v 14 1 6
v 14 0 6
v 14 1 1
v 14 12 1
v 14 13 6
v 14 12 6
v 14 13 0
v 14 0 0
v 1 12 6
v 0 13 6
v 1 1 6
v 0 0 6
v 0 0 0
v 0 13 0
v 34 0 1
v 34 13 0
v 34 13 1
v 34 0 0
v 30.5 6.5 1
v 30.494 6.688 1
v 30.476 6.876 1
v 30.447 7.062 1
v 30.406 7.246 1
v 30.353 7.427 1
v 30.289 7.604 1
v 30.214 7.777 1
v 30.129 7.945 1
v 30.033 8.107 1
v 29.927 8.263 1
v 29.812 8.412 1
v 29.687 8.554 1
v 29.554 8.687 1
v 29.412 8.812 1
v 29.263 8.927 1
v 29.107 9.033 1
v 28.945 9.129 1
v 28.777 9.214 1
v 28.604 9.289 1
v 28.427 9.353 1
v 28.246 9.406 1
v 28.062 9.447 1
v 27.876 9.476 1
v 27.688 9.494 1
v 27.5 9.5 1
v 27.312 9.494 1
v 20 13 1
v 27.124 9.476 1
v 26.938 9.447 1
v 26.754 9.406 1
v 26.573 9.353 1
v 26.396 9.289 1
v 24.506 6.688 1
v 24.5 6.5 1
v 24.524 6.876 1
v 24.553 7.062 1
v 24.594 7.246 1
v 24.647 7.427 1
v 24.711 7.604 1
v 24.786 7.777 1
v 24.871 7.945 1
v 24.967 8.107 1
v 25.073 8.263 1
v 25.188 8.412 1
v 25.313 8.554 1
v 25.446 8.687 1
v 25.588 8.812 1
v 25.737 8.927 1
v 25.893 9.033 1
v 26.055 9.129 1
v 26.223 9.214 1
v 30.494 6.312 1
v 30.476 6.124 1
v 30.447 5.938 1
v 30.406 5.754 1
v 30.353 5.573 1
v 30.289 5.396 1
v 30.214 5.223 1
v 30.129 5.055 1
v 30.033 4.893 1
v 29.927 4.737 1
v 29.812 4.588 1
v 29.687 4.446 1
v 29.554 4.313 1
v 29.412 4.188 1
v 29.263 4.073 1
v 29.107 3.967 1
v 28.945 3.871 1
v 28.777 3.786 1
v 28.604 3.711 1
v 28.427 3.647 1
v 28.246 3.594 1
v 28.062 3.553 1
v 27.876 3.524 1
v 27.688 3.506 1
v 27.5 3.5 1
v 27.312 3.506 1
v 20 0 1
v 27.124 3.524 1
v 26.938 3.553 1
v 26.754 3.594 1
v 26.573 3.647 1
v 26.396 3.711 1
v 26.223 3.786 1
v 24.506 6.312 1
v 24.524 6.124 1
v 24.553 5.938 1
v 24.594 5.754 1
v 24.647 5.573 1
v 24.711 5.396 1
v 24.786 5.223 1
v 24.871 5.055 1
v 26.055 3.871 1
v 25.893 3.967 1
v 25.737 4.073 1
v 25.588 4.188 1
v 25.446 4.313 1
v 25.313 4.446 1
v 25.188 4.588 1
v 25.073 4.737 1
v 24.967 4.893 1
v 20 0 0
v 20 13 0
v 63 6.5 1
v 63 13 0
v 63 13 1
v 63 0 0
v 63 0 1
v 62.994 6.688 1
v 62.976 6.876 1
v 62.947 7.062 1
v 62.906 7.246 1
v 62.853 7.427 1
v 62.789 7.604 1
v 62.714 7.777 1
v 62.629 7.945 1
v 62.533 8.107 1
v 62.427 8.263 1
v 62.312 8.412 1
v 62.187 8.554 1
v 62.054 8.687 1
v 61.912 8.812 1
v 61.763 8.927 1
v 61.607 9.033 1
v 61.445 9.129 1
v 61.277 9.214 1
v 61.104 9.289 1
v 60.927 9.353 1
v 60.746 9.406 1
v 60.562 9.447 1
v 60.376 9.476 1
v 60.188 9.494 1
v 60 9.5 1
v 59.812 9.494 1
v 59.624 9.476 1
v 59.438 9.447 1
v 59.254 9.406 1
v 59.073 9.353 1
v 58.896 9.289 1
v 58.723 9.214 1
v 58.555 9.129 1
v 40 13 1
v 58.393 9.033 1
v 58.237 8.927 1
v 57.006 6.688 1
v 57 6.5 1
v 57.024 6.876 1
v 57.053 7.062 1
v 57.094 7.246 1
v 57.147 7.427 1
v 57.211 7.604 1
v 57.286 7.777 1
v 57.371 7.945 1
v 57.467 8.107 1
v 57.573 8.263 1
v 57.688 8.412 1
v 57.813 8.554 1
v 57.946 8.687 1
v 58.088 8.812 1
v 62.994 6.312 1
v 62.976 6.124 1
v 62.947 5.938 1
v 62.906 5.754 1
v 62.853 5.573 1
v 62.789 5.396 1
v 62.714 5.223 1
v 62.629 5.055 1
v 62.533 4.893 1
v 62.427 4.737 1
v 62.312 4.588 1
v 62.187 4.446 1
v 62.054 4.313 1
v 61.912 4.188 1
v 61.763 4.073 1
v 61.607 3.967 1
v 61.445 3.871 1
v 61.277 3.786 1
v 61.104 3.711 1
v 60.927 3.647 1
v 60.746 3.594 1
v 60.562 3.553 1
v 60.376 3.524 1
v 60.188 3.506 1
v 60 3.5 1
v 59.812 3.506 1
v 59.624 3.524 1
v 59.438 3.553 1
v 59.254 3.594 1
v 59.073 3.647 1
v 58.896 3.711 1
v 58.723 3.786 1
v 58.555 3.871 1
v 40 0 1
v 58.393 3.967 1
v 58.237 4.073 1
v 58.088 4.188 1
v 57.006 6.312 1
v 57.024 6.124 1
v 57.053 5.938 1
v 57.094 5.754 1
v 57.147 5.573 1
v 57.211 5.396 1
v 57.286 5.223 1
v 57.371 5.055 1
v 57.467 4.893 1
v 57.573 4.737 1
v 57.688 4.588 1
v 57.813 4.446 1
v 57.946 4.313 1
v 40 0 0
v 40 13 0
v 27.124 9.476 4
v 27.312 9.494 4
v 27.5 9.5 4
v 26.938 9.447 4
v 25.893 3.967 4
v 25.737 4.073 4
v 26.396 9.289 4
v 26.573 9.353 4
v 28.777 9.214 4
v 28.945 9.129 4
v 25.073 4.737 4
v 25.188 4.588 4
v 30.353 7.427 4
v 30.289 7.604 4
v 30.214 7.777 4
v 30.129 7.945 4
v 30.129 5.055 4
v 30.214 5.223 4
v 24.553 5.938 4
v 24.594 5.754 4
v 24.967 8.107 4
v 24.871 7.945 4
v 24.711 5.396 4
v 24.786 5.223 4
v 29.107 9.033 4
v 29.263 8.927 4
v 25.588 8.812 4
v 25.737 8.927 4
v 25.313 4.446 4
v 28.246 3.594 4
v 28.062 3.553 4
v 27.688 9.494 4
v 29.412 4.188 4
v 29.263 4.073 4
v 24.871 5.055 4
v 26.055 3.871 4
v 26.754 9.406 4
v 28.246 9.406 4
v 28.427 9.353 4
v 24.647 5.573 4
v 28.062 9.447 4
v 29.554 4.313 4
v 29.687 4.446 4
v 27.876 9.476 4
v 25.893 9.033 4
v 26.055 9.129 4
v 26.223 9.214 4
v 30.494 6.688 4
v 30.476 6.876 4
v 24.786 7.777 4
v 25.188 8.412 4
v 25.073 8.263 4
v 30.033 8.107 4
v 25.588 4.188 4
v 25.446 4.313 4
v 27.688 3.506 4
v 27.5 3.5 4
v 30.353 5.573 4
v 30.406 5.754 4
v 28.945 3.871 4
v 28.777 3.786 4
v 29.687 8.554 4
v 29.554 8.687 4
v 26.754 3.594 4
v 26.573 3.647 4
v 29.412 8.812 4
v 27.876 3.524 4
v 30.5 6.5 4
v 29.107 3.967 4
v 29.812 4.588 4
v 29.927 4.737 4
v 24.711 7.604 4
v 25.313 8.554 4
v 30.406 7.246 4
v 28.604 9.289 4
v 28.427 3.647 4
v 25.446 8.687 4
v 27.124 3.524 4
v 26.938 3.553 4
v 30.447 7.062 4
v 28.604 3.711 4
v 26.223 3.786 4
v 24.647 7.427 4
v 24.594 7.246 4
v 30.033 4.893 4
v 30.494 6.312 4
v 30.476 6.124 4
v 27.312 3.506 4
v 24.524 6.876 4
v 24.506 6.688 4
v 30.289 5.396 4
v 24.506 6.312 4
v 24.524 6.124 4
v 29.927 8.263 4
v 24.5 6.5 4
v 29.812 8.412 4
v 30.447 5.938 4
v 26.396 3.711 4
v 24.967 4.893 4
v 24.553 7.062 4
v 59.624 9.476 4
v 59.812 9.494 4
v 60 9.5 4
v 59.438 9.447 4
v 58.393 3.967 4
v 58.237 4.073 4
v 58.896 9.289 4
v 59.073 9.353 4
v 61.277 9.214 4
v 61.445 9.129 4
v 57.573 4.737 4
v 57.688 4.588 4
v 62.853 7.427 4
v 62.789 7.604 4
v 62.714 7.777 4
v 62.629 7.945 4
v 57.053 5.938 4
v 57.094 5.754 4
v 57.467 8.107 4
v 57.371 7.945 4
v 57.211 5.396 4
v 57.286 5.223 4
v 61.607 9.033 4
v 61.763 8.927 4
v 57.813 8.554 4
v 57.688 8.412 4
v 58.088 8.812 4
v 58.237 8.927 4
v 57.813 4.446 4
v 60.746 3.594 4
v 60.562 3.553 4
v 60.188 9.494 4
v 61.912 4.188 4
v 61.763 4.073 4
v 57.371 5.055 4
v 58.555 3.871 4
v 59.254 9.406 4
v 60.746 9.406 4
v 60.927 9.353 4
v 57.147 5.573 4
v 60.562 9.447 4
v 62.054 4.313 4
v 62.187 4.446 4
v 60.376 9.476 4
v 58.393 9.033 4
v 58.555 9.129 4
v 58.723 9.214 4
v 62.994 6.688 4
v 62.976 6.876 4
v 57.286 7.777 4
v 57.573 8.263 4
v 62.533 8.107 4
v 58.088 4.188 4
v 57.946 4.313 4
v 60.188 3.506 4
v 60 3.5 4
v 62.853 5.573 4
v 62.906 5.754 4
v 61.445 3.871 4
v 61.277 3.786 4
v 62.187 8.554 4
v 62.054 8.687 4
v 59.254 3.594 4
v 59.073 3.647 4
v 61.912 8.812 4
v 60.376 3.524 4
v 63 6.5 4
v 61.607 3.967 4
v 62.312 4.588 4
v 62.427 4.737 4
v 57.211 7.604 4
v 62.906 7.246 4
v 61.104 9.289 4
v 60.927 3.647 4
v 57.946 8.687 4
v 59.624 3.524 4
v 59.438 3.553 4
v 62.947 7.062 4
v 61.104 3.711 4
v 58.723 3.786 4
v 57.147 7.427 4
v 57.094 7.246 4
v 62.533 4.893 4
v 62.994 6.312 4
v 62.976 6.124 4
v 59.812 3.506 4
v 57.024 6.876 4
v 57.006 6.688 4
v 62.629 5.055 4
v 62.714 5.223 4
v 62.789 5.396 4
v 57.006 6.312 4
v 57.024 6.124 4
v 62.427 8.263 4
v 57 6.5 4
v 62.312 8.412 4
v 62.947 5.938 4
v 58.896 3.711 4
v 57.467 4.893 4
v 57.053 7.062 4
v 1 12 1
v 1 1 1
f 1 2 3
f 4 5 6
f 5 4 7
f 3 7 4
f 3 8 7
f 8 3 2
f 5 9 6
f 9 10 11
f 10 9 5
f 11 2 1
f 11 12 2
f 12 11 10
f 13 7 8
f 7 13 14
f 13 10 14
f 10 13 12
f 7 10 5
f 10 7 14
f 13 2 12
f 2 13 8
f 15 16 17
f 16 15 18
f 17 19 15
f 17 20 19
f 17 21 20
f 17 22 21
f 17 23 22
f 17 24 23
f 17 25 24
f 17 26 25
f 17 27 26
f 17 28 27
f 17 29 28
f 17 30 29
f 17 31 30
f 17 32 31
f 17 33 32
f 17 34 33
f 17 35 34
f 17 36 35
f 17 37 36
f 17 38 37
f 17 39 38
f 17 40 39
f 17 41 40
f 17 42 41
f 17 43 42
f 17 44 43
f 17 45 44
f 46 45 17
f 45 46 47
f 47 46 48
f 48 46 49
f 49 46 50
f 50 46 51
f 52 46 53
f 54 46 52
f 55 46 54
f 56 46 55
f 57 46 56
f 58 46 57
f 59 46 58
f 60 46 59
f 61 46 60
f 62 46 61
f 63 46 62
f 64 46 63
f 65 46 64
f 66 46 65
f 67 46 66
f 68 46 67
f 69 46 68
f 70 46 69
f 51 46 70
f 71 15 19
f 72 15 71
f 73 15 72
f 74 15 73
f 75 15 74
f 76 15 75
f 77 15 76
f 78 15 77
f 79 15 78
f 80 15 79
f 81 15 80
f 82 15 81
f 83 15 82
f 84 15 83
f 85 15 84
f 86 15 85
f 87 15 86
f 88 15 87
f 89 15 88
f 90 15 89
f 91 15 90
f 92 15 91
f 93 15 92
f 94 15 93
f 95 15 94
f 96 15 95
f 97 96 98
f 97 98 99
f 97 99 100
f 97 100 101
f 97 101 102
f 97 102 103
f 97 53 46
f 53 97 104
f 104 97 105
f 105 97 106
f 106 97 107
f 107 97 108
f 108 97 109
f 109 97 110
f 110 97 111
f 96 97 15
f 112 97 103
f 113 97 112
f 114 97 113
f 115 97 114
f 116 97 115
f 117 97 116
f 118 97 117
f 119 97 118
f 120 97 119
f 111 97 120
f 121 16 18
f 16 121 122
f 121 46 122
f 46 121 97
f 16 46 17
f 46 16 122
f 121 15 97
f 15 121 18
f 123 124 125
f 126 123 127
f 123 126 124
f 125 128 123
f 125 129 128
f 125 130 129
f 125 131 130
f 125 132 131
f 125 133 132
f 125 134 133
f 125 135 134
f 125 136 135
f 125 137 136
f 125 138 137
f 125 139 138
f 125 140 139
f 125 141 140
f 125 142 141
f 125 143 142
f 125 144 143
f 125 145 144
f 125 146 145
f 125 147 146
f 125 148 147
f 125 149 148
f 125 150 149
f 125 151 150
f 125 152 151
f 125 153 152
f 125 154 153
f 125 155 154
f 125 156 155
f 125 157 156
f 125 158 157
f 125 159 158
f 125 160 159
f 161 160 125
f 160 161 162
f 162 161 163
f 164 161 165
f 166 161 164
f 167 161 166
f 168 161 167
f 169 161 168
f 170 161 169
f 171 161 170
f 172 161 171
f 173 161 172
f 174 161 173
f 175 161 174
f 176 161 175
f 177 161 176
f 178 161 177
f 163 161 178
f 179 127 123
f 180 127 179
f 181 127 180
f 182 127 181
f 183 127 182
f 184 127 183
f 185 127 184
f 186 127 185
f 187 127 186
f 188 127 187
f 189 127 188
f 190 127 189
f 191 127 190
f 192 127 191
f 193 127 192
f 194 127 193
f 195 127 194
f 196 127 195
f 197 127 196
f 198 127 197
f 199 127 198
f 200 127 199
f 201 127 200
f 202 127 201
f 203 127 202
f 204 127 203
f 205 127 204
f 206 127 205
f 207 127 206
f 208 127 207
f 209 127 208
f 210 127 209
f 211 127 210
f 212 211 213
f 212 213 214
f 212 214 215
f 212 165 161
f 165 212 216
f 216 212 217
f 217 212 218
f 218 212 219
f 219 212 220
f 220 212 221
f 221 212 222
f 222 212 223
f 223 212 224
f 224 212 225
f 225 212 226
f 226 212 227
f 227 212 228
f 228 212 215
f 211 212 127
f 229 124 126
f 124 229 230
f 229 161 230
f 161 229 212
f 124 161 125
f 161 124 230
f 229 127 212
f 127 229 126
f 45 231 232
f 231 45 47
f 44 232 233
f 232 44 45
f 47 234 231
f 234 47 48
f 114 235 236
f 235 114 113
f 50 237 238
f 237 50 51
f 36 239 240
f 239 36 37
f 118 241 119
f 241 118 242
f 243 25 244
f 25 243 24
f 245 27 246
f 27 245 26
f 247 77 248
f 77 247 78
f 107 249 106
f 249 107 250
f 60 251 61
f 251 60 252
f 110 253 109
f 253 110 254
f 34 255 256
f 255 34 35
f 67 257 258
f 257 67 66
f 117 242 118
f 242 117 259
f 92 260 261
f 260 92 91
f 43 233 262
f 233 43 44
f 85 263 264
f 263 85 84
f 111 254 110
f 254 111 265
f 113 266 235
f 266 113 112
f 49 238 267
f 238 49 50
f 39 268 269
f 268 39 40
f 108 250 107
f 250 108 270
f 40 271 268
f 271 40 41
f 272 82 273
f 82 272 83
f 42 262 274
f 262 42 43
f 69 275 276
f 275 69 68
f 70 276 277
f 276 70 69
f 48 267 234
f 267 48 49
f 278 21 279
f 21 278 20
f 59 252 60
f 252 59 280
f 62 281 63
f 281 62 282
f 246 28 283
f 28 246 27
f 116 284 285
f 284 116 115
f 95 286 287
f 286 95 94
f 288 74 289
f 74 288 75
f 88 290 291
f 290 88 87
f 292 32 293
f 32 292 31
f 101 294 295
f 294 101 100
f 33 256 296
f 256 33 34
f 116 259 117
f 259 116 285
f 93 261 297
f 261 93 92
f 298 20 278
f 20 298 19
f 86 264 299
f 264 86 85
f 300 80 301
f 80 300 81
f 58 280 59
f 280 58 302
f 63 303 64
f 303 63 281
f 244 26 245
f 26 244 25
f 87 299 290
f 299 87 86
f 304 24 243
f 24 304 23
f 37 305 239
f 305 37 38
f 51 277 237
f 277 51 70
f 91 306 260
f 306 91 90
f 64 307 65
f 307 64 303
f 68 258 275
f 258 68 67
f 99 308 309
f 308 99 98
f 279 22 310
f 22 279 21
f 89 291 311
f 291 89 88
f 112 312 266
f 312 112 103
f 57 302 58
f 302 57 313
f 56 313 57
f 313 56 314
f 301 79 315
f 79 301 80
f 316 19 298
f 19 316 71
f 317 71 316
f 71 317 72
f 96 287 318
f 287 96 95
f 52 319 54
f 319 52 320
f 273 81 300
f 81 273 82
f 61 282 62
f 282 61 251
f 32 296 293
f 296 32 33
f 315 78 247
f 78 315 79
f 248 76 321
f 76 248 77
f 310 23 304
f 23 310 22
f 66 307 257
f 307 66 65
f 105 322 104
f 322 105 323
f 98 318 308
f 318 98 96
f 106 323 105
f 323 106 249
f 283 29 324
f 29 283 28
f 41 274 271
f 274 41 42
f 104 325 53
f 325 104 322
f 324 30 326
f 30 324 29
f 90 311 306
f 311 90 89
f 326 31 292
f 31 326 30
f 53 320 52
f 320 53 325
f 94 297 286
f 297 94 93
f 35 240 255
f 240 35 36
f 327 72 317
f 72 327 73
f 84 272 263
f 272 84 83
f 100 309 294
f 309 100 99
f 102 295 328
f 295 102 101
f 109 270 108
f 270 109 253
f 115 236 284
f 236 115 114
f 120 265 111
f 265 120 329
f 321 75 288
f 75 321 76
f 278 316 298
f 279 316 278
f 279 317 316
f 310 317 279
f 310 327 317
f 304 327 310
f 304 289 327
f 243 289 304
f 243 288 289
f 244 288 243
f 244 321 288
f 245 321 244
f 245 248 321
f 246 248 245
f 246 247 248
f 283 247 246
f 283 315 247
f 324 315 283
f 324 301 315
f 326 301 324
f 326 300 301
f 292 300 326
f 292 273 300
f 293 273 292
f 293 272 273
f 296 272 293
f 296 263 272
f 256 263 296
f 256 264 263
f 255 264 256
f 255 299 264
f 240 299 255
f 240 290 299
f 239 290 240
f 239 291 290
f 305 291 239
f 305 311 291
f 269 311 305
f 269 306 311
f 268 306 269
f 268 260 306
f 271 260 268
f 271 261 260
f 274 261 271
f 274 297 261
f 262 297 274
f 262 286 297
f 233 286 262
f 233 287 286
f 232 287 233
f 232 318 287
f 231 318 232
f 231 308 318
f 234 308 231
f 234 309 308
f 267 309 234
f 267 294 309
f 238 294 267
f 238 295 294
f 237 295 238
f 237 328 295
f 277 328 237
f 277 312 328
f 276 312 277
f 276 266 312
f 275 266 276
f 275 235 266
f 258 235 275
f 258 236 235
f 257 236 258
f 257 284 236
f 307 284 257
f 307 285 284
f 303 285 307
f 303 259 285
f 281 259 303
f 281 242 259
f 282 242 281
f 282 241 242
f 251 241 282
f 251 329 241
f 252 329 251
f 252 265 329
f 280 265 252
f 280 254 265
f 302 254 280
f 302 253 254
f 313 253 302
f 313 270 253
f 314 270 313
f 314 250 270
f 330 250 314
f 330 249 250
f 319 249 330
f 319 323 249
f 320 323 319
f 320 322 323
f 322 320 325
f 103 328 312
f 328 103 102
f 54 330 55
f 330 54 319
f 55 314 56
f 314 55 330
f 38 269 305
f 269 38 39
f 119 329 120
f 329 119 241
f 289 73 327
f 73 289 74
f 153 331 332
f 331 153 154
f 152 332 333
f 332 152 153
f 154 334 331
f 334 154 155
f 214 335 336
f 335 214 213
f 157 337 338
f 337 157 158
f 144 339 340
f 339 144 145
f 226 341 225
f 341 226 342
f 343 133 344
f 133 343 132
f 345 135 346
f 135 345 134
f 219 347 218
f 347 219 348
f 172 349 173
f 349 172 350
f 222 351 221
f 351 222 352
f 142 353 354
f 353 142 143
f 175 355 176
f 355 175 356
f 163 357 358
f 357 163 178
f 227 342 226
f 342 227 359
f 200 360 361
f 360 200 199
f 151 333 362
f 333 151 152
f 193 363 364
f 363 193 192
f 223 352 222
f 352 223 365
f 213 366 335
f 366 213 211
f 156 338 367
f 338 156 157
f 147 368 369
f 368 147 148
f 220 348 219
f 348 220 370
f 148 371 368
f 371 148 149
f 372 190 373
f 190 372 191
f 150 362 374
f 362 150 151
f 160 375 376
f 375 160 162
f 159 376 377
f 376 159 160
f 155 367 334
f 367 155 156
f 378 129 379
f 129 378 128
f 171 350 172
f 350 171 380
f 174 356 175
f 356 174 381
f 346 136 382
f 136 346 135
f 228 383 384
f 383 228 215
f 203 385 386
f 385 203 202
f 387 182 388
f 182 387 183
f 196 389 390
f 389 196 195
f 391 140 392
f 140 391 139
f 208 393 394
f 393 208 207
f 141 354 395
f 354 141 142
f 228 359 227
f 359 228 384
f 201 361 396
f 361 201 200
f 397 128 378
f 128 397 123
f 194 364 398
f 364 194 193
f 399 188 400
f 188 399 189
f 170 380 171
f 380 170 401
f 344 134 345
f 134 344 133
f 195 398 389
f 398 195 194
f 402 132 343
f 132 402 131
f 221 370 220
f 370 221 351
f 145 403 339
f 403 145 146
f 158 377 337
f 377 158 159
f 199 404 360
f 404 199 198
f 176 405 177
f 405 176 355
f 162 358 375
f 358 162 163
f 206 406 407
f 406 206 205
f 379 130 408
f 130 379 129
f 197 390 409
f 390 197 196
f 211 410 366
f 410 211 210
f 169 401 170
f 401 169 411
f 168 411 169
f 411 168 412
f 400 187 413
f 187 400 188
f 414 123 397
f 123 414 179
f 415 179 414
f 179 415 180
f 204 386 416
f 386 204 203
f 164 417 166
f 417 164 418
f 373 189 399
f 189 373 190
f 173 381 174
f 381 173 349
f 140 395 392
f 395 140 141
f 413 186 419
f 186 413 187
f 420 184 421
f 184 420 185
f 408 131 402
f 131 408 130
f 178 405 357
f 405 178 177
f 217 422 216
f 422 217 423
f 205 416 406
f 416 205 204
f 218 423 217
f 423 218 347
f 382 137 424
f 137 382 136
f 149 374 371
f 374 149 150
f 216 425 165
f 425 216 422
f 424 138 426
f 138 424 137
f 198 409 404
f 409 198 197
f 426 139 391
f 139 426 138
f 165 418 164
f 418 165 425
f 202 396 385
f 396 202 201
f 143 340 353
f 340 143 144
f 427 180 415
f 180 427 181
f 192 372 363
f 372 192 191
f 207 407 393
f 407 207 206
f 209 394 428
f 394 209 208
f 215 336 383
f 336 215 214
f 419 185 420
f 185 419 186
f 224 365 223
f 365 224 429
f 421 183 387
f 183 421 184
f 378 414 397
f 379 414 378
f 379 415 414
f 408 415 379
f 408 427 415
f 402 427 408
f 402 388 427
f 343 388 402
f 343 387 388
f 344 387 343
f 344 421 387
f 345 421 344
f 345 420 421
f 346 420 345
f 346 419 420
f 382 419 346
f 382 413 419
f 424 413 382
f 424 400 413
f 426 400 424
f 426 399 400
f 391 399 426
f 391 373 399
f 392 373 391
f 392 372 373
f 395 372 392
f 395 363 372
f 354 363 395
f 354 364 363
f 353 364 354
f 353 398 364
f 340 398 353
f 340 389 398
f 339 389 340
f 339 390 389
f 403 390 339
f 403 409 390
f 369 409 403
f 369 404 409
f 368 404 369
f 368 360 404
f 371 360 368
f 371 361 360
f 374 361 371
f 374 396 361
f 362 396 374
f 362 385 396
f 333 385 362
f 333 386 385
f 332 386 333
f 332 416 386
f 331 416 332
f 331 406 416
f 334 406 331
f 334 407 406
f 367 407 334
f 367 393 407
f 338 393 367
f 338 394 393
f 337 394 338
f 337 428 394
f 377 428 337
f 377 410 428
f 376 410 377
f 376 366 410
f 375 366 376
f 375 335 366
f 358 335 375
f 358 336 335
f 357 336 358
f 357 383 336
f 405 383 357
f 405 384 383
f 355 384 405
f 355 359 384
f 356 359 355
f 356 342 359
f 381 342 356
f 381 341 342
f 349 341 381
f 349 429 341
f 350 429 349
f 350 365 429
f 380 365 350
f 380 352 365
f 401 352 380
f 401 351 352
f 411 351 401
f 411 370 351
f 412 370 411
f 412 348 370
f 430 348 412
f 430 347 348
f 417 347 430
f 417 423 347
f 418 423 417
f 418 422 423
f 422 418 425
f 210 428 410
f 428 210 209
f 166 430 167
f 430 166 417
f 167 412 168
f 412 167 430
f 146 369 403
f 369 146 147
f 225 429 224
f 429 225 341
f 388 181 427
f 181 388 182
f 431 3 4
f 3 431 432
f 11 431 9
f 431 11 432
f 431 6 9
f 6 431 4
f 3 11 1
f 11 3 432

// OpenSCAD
difference(){
	union(){
        translate([0,0,0]){
            rotate([0,0,0]){
                cube([14,13,6], center=false);
            }
        }        

        translate([20,0,0]){
            rotate([0,0,0]){
                cube([14,13,1], center=false);
            }
        }        

        translate([20+20,0,0]){
            rotate([0,0,0]){
                cube([23,13,1], center=false);
            }
        }        

      translate([20+15/2,13/2,0]){
            rotate([0,0,90]){
                cylinder(h=4, r=3, $fn=100, center=false);
            }
        }   


      translate([20+20+20,13/2,0]){
            rotate([0,0,90]){
                cylinder(h=4, r=3, $fn=100, center=false);
            }
        }   



        
	}
	union() {
        translate([1,1,1]){
            rotate([0,0,0]){
                cube([13.1,11,5.1], center=false);
            }
        }        

   
	}
}
